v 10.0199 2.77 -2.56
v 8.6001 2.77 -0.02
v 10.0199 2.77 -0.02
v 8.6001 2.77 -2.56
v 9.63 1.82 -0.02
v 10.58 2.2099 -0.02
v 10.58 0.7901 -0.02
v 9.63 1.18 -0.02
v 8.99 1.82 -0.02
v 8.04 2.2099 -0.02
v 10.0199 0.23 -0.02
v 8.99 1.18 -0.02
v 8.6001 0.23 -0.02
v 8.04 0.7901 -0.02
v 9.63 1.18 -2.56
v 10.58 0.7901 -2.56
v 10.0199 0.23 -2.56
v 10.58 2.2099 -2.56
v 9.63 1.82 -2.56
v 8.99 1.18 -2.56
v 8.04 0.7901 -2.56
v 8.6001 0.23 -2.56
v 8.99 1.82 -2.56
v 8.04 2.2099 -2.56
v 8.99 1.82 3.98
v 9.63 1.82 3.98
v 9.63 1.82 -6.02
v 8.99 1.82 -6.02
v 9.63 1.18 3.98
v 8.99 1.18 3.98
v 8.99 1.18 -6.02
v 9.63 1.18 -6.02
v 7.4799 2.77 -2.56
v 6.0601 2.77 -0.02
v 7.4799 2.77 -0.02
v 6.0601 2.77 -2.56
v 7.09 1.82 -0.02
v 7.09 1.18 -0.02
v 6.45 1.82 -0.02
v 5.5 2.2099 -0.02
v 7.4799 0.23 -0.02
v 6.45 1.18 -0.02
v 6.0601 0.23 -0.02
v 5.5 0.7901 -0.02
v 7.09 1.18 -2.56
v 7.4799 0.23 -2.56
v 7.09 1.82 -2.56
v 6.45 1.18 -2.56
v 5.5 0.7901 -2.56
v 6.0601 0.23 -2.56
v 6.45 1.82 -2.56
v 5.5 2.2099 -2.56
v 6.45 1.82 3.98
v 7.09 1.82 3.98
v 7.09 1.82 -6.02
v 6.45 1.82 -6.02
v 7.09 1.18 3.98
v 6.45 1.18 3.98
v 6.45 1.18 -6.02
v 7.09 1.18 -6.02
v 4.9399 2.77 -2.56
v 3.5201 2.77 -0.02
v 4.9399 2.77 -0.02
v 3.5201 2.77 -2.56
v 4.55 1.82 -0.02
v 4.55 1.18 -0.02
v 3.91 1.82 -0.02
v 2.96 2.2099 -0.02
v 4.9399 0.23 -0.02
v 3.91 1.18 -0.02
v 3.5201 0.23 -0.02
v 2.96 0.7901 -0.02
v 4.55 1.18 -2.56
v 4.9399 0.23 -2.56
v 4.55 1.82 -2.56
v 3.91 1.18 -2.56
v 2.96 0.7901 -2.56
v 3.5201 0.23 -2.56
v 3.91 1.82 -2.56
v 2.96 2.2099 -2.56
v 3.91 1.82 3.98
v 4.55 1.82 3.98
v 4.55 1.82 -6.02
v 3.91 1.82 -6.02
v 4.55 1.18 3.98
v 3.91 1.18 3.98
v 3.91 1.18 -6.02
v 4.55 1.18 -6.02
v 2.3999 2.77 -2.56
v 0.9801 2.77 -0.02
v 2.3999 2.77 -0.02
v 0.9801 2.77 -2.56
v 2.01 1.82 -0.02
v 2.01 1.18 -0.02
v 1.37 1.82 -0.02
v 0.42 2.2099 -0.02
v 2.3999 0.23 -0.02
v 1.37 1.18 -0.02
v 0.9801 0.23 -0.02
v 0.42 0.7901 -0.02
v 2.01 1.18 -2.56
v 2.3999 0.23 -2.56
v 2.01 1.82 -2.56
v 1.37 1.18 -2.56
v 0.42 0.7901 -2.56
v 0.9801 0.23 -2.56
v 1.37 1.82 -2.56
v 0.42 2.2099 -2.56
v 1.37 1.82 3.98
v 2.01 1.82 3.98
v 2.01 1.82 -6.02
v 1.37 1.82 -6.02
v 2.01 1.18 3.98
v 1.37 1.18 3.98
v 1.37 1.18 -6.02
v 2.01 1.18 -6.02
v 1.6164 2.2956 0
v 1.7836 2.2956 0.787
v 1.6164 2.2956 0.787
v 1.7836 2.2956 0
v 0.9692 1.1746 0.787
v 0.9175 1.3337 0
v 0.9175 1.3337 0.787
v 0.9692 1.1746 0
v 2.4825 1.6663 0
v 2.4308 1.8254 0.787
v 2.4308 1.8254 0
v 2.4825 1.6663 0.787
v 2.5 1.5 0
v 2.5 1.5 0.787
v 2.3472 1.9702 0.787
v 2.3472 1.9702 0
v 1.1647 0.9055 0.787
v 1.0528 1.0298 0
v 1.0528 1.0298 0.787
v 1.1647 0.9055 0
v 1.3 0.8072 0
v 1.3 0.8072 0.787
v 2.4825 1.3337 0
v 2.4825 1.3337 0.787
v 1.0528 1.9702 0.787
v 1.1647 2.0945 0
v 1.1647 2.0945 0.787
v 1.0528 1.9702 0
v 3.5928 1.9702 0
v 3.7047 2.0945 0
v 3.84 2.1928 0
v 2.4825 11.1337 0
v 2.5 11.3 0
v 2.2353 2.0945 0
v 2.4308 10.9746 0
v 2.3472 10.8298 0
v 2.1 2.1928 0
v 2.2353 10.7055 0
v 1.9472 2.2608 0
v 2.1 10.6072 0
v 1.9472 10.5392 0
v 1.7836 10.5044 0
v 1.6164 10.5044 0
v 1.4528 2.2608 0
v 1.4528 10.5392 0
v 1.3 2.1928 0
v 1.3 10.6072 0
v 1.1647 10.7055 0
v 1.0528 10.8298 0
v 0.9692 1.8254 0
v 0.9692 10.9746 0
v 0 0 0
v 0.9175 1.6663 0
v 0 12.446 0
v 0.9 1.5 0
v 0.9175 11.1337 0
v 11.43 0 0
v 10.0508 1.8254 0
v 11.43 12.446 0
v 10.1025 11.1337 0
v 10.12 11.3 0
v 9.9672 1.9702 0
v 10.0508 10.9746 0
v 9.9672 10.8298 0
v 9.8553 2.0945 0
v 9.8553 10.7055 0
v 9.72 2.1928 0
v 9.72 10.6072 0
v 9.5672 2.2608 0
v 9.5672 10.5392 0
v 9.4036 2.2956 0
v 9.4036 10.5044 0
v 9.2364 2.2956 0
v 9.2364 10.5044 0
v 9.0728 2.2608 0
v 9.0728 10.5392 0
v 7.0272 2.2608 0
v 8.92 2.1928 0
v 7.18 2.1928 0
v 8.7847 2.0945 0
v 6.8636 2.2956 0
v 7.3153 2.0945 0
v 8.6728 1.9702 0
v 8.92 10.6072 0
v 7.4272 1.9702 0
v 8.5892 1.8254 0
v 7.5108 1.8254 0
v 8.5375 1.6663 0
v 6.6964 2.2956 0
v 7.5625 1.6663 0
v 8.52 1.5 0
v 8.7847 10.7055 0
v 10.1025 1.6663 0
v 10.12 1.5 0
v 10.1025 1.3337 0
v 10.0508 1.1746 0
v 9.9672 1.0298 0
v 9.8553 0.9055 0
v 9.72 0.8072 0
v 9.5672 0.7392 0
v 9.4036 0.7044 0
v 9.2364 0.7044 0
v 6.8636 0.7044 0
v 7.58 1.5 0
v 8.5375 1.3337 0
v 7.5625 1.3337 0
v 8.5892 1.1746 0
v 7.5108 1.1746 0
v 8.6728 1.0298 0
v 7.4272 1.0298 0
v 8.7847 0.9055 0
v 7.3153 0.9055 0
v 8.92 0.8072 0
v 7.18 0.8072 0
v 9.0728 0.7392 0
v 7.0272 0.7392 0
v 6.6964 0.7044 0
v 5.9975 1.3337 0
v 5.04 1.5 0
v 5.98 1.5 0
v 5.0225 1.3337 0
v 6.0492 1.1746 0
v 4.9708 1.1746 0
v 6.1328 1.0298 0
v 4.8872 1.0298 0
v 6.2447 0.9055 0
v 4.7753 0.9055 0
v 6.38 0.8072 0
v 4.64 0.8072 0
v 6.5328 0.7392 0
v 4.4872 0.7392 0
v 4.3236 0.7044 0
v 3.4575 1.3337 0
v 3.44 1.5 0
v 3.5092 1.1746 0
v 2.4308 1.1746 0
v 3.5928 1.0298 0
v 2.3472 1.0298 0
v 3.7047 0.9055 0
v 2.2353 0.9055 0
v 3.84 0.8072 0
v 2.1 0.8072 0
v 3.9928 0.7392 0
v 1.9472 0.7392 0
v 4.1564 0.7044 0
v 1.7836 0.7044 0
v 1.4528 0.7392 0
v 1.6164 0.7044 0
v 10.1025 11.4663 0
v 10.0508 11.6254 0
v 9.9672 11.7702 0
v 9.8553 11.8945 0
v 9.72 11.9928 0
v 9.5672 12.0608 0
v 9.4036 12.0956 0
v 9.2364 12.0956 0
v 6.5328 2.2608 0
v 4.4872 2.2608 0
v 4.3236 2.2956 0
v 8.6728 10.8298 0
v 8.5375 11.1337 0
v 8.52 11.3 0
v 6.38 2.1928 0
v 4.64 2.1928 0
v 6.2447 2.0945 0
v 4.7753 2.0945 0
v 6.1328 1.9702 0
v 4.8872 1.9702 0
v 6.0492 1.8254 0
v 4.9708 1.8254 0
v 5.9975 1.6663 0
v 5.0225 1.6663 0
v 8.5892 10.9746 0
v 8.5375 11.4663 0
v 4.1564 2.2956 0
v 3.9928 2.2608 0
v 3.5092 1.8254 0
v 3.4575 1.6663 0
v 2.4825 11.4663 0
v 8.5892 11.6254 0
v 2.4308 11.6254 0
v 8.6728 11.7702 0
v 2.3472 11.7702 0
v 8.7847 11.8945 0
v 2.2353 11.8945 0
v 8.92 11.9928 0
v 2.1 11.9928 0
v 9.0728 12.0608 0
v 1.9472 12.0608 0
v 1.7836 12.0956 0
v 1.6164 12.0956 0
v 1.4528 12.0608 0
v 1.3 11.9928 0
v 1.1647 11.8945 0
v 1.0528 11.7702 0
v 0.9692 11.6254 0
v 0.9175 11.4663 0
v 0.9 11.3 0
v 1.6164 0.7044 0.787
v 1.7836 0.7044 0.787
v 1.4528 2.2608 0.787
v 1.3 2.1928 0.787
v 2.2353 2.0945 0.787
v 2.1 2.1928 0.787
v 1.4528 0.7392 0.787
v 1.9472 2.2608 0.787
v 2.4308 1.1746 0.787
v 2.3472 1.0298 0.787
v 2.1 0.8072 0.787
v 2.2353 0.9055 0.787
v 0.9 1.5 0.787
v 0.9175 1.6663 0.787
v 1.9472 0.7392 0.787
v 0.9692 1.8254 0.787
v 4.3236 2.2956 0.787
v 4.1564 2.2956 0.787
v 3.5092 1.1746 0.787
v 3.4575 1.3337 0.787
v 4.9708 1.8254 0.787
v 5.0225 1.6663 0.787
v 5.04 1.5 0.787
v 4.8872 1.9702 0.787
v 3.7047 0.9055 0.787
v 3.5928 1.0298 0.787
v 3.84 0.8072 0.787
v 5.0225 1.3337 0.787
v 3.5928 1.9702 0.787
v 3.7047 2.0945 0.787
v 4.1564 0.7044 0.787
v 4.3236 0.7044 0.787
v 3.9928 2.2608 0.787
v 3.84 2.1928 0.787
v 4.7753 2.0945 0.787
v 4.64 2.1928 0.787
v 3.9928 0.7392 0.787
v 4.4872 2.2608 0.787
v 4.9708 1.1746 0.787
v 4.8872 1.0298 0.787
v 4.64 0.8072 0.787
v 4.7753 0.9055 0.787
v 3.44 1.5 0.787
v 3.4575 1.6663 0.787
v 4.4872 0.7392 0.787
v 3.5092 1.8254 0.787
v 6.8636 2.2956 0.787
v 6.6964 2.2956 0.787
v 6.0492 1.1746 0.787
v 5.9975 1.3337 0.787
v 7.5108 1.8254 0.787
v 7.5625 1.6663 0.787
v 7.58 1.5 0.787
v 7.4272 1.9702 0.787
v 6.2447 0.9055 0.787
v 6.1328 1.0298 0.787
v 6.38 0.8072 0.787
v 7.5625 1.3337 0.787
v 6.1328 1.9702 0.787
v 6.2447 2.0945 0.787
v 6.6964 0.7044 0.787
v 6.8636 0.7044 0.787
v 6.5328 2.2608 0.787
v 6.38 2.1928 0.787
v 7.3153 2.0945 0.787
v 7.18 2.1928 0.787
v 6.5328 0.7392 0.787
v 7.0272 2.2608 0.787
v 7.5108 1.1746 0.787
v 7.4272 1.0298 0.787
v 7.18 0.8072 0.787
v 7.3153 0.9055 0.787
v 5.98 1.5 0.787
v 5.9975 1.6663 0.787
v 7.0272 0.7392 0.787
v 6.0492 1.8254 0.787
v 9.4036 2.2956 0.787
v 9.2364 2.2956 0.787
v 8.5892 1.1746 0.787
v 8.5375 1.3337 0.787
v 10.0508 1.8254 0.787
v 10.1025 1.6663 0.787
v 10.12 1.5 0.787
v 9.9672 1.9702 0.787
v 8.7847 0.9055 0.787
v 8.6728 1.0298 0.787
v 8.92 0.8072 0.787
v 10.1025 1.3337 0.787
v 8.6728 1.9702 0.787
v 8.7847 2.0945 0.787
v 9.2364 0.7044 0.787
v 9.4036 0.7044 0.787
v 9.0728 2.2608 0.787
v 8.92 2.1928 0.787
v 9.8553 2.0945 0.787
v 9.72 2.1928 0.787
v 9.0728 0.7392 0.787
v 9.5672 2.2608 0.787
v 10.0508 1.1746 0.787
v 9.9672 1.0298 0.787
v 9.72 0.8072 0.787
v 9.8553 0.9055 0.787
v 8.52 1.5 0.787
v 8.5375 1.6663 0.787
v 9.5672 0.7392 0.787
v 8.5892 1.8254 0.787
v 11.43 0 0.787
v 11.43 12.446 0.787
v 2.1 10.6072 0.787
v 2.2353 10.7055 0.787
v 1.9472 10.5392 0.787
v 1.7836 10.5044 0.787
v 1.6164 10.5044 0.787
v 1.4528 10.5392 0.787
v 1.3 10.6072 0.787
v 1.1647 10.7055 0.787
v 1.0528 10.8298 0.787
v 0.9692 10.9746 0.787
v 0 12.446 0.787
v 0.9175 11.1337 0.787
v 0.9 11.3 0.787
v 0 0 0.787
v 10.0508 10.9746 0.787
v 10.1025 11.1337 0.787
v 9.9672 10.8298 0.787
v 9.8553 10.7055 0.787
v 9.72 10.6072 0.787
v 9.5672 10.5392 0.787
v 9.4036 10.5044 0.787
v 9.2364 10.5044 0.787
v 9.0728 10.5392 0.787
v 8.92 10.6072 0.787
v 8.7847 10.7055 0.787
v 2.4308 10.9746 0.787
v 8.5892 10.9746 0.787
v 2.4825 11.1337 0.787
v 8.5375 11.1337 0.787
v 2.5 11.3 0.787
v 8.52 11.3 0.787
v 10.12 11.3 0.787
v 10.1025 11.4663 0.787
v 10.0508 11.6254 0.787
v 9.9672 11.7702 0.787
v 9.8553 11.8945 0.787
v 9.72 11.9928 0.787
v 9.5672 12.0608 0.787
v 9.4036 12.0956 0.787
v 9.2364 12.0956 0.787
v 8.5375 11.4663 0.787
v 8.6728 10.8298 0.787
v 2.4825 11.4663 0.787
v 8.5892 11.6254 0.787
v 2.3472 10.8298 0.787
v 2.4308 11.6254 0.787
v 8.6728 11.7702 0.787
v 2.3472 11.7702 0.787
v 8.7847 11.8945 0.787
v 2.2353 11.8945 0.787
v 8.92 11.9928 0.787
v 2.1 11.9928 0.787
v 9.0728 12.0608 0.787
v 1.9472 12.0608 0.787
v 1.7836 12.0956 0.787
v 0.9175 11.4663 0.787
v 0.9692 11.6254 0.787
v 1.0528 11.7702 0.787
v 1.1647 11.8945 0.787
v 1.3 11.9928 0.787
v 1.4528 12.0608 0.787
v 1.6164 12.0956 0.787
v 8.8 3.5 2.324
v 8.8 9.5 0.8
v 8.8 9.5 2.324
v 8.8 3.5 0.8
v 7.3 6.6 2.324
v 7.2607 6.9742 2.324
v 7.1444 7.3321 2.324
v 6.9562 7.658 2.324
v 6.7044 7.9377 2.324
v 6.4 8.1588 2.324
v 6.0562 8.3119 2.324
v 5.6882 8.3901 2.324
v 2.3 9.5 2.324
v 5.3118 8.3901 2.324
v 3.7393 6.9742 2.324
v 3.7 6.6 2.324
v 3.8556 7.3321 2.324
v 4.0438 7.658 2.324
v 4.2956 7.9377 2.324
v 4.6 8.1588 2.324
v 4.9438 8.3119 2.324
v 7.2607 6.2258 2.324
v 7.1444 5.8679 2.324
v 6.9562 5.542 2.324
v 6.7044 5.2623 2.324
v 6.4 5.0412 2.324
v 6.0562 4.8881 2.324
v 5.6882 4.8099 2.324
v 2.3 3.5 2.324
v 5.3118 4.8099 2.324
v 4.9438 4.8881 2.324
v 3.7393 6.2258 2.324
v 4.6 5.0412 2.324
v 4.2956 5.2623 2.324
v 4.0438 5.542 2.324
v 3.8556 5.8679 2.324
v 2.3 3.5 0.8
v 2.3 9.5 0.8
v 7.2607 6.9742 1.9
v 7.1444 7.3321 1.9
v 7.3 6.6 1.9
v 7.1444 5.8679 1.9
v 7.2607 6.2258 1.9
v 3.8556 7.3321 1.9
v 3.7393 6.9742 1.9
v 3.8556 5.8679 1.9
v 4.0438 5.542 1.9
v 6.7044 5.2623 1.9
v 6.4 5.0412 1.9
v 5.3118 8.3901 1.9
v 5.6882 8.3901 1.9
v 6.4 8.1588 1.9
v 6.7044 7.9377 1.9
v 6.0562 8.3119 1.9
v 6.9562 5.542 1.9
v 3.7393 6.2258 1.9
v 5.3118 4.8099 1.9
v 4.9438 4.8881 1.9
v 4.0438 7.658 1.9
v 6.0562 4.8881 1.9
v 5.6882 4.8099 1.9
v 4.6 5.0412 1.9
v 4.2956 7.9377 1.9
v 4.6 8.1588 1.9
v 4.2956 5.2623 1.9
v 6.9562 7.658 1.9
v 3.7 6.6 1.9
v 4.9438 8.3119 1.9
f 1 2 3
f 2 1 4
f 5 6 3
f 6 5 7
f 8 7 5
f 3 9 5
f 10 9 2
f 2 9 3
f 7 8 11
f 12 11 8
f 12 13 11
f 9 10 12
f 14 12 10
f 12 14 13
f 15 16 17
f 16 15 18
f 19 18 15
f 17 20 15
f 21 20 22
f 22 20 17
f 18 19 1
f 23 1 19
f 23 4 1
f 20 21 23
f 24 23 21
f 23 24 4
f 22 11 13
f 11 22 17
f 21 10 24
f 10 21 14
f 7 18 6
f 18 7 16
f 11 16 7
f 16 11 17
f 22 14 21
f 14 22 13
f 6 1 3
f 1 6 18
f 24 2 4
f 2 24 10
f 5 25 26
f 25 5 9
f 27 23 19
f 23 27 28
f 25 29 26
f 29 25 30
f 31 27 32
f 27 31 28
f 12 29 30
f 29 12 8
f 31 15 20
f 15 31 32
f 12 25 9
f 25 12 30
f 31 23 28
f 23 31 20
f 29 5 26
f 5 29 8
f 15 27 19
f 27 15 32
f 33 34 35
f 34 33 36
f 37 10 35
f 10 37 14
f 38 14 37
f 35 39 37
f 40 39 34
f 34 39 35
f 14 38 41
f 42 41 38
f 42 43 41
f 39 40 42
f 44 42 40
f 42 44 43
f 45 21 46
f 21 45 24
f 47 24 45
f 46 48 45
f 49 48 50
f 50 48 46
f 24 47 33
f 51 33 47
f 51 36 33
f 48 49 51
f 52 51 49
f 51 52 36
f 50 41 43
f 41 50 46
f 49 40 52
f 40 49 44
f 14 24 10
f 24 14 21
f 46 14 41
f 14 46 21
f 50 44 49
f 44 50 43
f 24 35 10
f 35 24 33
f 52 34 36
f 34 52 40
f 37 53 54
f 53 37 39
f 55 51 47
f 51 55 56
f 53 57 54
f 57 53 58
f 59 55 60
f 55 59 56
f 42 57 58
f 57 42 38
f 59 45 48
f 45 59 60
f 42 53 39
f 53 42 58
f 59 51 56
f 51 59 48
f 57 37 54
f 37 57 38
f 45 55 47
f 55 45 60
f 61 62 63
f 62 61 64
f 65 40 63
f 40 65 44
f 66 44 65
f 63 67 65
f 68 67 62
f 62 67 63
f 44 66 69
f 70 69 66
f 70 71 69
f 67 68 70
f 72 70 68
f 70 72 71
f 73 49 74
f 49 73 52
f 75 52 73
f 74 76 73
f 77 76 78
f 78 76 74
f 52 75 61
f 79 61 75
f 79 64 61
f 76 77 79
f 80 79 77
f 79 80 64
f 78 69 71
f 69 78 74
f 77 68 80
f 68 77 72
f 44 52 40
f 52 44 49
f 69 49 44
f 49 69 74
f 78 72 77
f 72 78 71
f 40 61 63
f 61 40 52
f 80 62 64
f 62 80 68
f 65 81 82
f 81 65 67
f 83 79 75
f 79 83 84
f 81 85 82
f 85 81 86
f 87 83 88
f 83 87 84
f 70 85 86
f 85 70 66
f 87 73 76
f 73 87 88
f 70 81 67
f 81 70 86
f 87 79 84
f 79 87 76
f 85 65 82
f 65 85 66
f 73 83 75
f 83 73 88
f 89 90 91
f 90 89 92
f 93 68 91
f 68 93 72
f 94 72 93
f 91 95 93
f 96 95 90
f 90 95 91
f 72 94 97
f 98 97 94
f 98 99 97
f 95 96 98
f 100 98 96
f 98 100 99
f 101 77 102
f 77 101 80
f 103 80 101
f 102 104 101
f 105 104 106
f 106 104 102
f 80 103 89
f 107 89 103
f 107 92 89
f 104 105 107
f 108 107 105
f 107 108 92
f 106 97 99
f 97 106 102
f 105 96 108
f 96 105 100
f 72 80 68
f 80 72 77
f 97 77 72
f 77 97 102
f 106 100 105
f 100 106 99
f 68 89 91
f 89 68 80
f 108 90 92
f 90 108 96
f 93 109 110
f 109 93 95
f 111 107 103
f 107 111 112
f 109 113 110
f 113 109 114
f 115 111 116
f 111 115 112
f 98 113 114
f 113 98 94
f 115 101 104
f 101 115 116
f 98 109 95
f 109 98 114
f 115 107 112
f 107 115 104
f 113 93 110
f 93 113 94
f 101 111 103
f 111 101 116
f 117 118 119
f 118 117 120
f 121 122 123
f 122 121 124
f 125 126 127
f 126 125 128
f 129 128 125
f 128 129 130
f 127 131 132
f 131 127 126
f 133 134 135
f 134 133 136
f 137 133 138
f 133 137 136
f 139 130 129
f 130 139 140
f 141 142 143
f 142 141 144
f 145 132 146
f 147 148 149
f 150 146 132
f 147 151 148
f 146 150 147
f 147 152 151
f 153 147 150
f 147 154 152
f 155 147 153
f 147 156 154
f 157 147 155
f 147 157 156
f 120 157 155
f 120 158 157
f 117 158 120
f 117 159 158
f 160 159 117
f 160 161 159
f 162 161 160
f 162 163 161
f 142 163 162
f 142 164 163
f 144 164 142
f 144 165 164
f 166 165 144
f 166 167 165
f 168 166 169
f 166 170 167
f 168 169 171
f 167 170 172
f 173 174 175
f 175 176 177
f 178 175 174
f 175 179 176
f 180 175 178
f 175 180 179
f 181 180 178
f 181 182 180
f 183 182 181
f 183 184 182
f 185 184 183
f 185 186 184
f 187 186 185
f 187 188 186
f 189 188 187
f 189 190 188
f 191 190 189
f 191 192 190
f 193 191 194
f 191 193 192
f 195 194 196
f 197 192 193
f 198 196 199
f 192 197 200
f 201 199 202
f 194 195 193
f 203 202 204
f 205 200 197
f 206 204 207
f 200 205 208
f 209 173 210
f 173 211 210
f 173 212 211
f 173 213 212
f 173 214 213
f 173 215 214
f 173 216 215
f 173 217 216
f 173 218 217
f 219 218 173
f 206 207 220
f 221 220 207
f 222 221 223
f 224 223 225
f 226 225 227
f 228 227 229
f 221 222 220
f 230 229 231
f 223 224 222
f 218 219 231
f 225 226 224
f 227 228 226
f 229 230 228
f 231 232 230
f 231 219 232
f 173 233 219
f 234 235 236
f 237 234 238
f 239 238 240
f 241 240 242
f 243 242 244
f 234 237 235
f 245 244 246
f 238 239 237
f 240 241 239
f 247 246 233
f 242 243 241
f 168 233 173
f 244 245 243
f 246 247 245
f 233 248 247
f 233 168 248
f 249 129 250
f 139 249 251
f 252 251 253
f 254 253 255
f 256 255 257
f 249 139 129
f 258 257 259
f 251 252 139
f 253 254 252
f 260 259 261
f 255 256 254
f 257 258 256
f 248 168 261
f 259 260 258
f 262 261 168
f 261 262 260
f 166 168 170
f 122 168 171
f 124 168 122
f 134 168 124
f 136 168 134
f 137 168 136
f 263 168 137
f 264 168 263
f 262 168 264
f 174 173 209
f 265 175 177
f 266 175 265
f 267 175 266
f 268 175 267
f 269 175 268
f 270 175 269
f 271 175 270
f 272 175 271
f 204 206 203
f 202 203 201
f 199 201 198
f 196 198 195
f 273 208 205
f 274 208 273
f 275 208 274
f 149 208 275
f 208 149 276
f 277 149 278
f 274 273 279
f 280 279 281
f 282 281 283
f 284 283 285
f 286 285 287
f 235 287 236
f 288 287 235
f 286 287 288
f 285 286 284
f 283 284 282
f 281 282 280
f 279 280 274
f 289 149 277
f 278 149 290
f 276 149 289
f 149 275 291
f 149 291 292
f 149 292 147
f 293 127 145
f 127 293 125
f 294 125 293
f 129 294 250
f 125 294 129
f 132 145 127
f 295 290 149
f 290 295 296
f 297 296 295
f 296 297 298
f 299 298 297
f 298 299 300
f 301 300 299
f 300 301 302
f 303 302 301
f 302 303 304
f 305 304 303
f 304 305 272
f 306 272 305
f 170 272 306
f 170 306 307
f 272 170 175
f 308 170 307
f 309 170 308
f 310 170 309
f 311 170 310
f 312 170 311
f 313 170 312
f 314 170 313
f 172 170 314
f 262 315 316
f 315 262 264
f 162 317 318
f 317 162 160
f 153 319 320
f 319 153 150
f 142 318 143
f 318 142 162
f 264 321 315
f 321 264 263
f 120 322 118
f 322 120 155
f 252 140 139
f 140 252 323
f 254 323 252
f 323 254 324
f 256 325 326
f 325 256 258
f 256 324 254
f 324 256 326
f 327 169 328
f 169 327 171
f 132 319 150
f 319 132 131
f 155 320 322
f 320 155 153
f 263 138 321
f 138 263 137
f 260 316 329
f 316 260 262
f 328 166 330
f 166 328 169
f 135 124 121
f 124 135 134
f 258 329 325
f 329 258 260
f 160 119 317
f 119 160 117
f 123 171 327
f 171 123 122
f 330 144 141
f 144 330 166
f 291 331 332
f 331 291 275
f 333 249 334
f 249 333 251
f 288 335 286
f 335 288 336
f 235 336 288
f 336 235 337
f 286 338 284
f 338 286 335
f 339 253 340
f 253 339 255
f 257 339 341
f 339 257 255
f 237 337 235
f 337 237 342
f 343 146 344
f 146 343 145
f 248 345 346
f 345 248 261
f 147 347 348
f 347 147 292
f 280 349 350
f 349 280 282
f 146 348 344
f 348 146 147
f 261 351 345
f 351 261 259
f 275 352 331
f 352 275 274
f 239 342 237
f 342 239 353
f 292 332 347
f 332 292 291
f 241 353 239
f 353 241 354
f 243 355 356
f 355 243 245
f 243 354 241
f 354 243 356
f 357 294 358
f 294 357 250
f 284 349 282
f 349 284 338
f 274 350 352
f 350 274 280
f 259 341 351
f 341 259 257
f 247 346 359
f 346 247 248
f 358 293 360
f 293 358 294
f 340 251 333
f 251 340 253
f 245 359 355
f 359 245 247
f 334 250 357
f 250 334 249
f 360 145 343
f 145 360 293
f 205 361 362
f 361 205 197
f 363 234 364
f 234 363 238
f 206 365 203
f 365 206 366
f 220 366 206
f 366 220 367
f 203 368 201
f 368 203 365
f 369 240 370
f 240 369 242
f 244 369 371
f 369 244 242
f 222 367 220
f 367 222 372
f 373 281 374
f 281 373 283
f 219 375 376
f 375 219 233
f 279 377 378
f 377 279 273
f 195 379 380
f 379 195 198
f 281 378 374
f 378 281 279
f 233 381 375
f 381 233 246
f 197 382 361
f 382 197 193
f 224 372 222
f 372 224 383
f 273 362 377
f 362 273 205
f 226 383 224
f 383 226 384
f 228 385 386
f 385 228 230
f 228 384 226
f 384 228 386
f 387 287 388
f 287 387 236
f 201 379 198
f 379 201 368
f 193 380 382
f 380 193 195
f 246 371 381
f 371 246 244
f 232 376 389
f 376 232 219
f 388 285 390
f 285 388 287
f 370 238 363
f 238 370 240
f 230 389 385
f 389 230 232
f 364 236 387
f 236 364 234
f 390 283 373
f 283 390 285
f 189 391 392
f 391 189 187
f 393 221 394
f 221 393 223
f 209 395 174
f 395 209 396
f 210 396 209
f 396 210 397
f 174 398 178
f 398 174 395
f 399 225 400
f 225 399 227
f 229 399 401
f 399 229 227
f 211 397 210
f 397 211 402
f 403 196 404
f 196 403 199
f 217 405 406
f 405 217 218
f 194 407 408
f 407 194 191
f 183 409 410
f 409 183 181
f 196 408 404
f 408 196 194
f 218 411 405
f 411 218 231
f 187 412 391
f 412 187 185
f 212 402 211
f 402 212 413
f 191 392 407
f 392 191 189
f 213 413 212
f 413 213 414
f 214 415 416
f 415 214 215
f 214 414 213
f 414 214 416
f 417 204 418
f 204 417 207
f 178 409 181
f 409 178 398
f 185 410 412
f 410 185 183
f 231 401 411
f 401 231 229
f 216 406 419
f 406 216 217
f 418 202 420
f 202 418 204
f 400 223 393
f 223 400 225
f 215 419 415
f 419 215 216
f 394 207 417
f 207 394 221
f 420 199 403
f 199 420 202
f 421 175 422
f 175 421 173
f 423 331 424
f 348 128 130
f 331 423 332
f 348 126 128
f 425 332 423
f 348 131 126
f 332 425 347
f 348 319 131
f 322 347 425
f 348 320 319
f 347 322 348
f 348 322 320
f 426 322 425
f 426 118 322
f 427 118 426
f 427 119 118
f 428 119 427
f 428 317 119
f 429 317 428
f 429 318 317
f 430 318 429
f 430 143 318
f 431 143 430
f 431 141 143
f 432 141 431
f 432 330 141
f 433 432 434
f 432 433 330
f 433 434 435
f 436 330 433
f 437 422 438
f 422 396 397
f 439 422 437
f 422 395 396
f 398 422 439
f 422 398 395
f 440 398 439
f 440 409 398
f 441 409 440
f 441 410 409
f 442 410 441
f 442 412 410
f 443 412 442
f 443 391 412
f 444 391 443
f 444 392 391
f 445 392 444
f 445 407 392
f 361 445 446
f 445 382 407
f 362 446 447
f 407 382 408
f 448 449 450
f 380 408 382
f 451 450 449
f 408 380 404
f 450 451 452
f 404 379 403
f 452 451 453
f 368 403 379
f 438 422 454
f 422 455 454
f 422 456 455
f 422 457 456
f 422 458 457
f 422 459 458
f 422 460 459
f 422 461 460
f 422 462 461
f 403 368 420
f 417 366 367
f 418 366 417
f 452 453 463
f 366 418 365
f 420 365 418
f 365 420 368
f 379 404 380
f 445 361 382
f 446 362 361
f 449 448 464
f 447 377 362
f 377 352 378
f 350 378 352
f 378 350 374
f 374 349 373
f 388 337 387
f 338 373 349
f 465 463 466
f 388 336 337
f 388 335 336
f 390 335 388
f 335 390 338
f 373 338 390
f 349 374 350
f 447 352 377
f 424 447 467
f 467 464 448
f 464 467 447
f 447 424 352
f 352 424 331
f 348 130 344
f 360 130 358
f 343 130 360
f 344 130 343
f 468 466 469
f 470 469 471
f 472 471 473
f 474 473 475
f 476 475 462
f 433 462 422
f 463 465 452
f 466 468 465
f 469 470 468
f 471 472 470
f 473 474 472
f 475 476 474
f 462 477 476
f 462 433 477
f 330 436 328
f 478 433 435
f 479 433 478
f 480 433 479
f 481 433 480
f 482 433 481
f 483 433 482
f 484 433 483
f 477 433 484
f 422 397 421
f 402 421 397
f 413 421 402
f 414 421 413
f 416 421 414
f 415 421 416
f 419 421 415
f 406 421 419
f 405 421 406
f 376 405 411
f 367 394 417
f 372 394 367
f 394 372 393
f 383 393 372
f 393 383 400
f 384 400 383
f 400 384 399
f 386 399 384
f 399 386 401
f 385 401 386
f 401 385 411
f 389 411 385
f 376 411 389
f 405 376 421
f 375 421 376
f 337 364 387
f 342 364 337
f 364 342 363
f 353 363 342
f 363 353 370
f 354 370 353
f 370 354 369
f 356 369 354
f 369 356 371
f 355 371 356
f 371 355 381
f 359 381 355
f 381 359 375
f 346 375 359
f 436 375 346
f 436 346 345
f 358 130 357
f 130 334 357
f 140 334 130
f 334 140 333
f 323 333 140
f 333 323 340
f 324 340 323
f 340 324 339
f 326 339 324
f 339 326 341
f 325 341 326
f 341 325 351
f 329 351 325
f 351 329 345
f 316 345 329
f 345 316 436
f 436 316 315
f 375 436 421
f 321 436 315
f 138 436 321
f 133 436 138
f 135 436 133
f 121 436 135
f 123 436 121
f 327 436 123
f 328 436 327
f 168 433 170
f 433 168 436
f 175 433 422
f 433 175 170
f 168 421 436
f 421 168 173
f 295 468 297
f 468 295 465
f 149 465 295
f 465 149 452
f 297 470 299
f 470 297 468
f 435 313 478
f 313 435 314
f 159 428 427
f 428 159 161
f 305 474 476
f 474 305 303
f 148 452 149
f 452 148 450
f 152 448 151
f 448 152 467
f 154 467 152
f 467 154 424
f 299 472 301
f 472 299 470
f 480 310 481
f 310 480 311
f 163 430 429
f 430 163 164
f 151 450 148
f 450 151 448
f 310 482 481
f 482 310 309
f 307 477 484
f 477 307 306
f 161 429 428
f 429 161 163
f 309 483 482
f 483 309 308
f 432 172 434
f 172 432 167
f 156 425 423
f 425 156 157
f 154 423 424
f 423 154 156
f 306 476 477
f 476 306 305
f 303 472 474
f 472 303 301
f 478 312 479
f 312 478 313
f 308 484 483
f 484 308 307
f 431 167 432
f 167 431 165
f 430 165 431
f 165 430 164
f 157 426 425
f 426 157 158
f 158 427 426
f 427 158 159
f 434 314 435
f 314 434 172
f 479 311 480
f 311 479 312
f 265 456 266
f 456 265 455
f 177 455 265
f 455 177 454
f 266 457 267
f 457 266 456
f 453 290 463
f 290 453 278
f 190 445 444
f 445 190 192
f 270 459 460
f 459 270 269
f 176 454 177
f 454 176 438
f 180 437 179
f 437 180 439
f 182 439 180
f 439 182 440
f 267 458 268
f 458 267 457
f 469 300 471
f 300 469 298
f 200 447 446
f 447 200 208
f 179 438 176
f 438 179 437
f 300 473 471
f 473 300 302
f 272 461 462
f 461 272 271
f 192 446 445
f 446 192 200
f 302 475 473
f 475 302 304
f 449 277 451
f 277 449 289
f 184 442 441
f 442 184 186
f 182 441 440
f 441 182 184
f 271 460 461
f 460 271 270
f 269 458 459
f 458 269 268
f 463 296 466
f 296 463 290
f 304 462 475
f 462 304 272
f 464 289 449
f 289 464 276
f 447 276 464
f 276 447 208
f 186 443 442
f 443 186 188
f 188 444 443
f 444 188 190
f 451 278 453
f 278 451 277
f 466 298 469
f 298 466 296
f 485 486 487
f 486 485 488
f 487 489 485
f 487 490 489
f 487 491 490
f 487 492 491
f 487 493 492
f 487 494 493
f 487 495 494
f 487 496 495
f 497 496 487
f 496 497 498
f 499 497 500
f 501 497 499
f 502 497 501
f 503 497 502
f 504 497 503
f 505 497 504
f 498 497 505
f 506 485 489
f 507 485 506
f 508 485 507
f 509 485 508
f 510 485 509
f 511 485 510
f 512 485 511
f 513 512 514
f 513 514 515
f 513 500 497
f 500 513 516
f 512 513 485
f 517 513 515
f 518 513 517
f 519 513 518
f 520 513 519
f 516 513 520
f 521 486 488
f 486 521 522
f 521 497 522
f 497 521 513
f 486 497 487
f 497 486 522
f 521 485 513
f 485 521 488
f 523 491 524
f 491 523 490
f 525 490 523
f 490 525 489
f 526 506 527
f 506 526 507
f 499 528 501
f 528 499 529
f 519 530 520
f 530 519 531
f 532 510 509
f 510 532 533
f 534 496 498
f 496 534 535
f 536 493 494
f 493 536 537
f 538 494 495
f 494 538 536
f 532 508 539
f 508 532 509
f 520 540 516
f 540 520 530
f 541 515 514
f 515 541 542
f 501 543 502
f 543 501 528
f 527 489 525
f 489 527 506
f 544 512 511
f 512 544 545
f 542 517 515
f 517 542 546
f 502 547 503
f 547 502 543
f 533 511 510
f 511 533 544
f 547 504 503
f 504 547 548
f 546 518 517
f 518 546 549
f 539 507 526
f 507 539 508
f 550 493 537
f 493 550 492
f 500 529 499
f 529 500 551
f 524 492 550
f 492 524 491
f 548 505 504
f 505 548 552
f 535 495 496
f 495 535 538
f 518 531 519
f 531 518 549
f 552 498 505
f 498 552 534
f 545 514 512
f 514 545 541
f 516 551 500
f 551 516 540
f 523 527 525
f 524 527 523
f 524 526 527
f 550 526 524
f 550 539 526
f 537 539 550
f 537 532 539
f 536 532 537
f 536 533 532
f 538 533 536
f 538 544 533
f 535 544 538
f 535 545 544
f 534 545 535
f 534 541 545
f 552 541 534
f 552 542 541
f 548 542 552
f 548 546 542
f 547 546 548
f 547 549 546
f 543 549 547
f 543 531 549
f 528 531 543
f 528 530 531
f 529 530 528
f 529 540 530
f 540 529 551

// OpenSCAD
// file: pin_headers.scad
// pin_headers.scad
//
// Model of through-hole pin headers. 
// 
// Units are metric
//
// "height" is the total length of the pin. Default is 12mm.
// "upper" is the length of the pin above the stopper. Default is 7mm.
// "rows" is the number of rows. Default is 3.
// "cols" is the number of columns. Default is 2.
//
// Examples:
// pin_header( 12, 7, 2, 5);
// pin_header( rows=5 cols=1 );
// By Paul McGovern

module pin_header( height=12, upper=7, rows=3, cols=2 ) {

	cl = 2.54;

	translate( [ -(rows  * cl/2 ) + cl /2, -(cols  * cl/2 ) + cl /2, 0 ] ) {

		for( col = [0: cols -1 ] ) {
			for( row = [0 : rows -1 ] ) {

				translate( [ cl * row , cl * col, 0] ) {
	
					color( "gray" )
						translate( [0,0, cl / 2]) {
							intersection() {
								cube( [ cl, cl, cl ], center=true );
								rotate( [0, 0, 45] ) cube( [ 2.8, 2.8, cl ], center=true );
						}
				}

				color( "silver" ) {
					translate( [0,0, (upper - ( height/2 )) + cl ] ) {
						union() {
							cube( [0.64,0.64,height], center=true );
							translate( [0,0, height/2 ] ) scale( 0.64 ) _pin_point();
							translate( [0,0, -height/2 ] ) scale( 0.64 )	rotate([180,0,0] )_pin_point();
						}
					}
				}
			}
		}
	}
}
}

module _pin_point() {
	translate( [-0.5,-0.5, 0])
		polyhedron( 
			points=[[0,0,0],[0,1,0],[1,1,0],[1,0,0],[0.5,0.5,0.5]], 
			triangles=[[0,1,2],[0,2,3],[0,1,4],[1,2,4],[2,3,4],[3,0,4]]);
}
// main file
//MinM Module
//Matthew Nelson
//Aerodyne Labs - 2013

//Uses the pin_headers module by Paul McGovern under the  Creative Commons - Attribution - Share Alike

use <pin_headers.scad>
//Generate the pin header
translate ([5.5,1.5,-2.56]) rotate ([0,0,90]) pin_header( 10,4,1,4 );

//Generate PCB Board
difference(){
color([1,1,1]) cube([11.43,12.446,.787]);

//Generate holes in PCB
for (i= [0:3])
{
translate ([1.7+(i*2.54),1.5,0]) cylinder(h=1.1,r=.8,$fn=30);
}

translate ([1.7+(0*2.54),11.3,0]) cylinder(h=1.1,r=.8,$fn=30);
translate ([1.7+(3*2.54),11.3,0]) cylinder(h=1.1,r=.8,$fn=30);
}

//Generate RGB LED
difference() {
translate ([2.3,3.5,.8]) color([.9,.9,.9]) cube([6.5,6,1.524]);

  	translate ([5.5,6.6,1.9]) color([1,0,0]) # cylinder(h=.5,r=1.8,$fn=30); 
  
}
